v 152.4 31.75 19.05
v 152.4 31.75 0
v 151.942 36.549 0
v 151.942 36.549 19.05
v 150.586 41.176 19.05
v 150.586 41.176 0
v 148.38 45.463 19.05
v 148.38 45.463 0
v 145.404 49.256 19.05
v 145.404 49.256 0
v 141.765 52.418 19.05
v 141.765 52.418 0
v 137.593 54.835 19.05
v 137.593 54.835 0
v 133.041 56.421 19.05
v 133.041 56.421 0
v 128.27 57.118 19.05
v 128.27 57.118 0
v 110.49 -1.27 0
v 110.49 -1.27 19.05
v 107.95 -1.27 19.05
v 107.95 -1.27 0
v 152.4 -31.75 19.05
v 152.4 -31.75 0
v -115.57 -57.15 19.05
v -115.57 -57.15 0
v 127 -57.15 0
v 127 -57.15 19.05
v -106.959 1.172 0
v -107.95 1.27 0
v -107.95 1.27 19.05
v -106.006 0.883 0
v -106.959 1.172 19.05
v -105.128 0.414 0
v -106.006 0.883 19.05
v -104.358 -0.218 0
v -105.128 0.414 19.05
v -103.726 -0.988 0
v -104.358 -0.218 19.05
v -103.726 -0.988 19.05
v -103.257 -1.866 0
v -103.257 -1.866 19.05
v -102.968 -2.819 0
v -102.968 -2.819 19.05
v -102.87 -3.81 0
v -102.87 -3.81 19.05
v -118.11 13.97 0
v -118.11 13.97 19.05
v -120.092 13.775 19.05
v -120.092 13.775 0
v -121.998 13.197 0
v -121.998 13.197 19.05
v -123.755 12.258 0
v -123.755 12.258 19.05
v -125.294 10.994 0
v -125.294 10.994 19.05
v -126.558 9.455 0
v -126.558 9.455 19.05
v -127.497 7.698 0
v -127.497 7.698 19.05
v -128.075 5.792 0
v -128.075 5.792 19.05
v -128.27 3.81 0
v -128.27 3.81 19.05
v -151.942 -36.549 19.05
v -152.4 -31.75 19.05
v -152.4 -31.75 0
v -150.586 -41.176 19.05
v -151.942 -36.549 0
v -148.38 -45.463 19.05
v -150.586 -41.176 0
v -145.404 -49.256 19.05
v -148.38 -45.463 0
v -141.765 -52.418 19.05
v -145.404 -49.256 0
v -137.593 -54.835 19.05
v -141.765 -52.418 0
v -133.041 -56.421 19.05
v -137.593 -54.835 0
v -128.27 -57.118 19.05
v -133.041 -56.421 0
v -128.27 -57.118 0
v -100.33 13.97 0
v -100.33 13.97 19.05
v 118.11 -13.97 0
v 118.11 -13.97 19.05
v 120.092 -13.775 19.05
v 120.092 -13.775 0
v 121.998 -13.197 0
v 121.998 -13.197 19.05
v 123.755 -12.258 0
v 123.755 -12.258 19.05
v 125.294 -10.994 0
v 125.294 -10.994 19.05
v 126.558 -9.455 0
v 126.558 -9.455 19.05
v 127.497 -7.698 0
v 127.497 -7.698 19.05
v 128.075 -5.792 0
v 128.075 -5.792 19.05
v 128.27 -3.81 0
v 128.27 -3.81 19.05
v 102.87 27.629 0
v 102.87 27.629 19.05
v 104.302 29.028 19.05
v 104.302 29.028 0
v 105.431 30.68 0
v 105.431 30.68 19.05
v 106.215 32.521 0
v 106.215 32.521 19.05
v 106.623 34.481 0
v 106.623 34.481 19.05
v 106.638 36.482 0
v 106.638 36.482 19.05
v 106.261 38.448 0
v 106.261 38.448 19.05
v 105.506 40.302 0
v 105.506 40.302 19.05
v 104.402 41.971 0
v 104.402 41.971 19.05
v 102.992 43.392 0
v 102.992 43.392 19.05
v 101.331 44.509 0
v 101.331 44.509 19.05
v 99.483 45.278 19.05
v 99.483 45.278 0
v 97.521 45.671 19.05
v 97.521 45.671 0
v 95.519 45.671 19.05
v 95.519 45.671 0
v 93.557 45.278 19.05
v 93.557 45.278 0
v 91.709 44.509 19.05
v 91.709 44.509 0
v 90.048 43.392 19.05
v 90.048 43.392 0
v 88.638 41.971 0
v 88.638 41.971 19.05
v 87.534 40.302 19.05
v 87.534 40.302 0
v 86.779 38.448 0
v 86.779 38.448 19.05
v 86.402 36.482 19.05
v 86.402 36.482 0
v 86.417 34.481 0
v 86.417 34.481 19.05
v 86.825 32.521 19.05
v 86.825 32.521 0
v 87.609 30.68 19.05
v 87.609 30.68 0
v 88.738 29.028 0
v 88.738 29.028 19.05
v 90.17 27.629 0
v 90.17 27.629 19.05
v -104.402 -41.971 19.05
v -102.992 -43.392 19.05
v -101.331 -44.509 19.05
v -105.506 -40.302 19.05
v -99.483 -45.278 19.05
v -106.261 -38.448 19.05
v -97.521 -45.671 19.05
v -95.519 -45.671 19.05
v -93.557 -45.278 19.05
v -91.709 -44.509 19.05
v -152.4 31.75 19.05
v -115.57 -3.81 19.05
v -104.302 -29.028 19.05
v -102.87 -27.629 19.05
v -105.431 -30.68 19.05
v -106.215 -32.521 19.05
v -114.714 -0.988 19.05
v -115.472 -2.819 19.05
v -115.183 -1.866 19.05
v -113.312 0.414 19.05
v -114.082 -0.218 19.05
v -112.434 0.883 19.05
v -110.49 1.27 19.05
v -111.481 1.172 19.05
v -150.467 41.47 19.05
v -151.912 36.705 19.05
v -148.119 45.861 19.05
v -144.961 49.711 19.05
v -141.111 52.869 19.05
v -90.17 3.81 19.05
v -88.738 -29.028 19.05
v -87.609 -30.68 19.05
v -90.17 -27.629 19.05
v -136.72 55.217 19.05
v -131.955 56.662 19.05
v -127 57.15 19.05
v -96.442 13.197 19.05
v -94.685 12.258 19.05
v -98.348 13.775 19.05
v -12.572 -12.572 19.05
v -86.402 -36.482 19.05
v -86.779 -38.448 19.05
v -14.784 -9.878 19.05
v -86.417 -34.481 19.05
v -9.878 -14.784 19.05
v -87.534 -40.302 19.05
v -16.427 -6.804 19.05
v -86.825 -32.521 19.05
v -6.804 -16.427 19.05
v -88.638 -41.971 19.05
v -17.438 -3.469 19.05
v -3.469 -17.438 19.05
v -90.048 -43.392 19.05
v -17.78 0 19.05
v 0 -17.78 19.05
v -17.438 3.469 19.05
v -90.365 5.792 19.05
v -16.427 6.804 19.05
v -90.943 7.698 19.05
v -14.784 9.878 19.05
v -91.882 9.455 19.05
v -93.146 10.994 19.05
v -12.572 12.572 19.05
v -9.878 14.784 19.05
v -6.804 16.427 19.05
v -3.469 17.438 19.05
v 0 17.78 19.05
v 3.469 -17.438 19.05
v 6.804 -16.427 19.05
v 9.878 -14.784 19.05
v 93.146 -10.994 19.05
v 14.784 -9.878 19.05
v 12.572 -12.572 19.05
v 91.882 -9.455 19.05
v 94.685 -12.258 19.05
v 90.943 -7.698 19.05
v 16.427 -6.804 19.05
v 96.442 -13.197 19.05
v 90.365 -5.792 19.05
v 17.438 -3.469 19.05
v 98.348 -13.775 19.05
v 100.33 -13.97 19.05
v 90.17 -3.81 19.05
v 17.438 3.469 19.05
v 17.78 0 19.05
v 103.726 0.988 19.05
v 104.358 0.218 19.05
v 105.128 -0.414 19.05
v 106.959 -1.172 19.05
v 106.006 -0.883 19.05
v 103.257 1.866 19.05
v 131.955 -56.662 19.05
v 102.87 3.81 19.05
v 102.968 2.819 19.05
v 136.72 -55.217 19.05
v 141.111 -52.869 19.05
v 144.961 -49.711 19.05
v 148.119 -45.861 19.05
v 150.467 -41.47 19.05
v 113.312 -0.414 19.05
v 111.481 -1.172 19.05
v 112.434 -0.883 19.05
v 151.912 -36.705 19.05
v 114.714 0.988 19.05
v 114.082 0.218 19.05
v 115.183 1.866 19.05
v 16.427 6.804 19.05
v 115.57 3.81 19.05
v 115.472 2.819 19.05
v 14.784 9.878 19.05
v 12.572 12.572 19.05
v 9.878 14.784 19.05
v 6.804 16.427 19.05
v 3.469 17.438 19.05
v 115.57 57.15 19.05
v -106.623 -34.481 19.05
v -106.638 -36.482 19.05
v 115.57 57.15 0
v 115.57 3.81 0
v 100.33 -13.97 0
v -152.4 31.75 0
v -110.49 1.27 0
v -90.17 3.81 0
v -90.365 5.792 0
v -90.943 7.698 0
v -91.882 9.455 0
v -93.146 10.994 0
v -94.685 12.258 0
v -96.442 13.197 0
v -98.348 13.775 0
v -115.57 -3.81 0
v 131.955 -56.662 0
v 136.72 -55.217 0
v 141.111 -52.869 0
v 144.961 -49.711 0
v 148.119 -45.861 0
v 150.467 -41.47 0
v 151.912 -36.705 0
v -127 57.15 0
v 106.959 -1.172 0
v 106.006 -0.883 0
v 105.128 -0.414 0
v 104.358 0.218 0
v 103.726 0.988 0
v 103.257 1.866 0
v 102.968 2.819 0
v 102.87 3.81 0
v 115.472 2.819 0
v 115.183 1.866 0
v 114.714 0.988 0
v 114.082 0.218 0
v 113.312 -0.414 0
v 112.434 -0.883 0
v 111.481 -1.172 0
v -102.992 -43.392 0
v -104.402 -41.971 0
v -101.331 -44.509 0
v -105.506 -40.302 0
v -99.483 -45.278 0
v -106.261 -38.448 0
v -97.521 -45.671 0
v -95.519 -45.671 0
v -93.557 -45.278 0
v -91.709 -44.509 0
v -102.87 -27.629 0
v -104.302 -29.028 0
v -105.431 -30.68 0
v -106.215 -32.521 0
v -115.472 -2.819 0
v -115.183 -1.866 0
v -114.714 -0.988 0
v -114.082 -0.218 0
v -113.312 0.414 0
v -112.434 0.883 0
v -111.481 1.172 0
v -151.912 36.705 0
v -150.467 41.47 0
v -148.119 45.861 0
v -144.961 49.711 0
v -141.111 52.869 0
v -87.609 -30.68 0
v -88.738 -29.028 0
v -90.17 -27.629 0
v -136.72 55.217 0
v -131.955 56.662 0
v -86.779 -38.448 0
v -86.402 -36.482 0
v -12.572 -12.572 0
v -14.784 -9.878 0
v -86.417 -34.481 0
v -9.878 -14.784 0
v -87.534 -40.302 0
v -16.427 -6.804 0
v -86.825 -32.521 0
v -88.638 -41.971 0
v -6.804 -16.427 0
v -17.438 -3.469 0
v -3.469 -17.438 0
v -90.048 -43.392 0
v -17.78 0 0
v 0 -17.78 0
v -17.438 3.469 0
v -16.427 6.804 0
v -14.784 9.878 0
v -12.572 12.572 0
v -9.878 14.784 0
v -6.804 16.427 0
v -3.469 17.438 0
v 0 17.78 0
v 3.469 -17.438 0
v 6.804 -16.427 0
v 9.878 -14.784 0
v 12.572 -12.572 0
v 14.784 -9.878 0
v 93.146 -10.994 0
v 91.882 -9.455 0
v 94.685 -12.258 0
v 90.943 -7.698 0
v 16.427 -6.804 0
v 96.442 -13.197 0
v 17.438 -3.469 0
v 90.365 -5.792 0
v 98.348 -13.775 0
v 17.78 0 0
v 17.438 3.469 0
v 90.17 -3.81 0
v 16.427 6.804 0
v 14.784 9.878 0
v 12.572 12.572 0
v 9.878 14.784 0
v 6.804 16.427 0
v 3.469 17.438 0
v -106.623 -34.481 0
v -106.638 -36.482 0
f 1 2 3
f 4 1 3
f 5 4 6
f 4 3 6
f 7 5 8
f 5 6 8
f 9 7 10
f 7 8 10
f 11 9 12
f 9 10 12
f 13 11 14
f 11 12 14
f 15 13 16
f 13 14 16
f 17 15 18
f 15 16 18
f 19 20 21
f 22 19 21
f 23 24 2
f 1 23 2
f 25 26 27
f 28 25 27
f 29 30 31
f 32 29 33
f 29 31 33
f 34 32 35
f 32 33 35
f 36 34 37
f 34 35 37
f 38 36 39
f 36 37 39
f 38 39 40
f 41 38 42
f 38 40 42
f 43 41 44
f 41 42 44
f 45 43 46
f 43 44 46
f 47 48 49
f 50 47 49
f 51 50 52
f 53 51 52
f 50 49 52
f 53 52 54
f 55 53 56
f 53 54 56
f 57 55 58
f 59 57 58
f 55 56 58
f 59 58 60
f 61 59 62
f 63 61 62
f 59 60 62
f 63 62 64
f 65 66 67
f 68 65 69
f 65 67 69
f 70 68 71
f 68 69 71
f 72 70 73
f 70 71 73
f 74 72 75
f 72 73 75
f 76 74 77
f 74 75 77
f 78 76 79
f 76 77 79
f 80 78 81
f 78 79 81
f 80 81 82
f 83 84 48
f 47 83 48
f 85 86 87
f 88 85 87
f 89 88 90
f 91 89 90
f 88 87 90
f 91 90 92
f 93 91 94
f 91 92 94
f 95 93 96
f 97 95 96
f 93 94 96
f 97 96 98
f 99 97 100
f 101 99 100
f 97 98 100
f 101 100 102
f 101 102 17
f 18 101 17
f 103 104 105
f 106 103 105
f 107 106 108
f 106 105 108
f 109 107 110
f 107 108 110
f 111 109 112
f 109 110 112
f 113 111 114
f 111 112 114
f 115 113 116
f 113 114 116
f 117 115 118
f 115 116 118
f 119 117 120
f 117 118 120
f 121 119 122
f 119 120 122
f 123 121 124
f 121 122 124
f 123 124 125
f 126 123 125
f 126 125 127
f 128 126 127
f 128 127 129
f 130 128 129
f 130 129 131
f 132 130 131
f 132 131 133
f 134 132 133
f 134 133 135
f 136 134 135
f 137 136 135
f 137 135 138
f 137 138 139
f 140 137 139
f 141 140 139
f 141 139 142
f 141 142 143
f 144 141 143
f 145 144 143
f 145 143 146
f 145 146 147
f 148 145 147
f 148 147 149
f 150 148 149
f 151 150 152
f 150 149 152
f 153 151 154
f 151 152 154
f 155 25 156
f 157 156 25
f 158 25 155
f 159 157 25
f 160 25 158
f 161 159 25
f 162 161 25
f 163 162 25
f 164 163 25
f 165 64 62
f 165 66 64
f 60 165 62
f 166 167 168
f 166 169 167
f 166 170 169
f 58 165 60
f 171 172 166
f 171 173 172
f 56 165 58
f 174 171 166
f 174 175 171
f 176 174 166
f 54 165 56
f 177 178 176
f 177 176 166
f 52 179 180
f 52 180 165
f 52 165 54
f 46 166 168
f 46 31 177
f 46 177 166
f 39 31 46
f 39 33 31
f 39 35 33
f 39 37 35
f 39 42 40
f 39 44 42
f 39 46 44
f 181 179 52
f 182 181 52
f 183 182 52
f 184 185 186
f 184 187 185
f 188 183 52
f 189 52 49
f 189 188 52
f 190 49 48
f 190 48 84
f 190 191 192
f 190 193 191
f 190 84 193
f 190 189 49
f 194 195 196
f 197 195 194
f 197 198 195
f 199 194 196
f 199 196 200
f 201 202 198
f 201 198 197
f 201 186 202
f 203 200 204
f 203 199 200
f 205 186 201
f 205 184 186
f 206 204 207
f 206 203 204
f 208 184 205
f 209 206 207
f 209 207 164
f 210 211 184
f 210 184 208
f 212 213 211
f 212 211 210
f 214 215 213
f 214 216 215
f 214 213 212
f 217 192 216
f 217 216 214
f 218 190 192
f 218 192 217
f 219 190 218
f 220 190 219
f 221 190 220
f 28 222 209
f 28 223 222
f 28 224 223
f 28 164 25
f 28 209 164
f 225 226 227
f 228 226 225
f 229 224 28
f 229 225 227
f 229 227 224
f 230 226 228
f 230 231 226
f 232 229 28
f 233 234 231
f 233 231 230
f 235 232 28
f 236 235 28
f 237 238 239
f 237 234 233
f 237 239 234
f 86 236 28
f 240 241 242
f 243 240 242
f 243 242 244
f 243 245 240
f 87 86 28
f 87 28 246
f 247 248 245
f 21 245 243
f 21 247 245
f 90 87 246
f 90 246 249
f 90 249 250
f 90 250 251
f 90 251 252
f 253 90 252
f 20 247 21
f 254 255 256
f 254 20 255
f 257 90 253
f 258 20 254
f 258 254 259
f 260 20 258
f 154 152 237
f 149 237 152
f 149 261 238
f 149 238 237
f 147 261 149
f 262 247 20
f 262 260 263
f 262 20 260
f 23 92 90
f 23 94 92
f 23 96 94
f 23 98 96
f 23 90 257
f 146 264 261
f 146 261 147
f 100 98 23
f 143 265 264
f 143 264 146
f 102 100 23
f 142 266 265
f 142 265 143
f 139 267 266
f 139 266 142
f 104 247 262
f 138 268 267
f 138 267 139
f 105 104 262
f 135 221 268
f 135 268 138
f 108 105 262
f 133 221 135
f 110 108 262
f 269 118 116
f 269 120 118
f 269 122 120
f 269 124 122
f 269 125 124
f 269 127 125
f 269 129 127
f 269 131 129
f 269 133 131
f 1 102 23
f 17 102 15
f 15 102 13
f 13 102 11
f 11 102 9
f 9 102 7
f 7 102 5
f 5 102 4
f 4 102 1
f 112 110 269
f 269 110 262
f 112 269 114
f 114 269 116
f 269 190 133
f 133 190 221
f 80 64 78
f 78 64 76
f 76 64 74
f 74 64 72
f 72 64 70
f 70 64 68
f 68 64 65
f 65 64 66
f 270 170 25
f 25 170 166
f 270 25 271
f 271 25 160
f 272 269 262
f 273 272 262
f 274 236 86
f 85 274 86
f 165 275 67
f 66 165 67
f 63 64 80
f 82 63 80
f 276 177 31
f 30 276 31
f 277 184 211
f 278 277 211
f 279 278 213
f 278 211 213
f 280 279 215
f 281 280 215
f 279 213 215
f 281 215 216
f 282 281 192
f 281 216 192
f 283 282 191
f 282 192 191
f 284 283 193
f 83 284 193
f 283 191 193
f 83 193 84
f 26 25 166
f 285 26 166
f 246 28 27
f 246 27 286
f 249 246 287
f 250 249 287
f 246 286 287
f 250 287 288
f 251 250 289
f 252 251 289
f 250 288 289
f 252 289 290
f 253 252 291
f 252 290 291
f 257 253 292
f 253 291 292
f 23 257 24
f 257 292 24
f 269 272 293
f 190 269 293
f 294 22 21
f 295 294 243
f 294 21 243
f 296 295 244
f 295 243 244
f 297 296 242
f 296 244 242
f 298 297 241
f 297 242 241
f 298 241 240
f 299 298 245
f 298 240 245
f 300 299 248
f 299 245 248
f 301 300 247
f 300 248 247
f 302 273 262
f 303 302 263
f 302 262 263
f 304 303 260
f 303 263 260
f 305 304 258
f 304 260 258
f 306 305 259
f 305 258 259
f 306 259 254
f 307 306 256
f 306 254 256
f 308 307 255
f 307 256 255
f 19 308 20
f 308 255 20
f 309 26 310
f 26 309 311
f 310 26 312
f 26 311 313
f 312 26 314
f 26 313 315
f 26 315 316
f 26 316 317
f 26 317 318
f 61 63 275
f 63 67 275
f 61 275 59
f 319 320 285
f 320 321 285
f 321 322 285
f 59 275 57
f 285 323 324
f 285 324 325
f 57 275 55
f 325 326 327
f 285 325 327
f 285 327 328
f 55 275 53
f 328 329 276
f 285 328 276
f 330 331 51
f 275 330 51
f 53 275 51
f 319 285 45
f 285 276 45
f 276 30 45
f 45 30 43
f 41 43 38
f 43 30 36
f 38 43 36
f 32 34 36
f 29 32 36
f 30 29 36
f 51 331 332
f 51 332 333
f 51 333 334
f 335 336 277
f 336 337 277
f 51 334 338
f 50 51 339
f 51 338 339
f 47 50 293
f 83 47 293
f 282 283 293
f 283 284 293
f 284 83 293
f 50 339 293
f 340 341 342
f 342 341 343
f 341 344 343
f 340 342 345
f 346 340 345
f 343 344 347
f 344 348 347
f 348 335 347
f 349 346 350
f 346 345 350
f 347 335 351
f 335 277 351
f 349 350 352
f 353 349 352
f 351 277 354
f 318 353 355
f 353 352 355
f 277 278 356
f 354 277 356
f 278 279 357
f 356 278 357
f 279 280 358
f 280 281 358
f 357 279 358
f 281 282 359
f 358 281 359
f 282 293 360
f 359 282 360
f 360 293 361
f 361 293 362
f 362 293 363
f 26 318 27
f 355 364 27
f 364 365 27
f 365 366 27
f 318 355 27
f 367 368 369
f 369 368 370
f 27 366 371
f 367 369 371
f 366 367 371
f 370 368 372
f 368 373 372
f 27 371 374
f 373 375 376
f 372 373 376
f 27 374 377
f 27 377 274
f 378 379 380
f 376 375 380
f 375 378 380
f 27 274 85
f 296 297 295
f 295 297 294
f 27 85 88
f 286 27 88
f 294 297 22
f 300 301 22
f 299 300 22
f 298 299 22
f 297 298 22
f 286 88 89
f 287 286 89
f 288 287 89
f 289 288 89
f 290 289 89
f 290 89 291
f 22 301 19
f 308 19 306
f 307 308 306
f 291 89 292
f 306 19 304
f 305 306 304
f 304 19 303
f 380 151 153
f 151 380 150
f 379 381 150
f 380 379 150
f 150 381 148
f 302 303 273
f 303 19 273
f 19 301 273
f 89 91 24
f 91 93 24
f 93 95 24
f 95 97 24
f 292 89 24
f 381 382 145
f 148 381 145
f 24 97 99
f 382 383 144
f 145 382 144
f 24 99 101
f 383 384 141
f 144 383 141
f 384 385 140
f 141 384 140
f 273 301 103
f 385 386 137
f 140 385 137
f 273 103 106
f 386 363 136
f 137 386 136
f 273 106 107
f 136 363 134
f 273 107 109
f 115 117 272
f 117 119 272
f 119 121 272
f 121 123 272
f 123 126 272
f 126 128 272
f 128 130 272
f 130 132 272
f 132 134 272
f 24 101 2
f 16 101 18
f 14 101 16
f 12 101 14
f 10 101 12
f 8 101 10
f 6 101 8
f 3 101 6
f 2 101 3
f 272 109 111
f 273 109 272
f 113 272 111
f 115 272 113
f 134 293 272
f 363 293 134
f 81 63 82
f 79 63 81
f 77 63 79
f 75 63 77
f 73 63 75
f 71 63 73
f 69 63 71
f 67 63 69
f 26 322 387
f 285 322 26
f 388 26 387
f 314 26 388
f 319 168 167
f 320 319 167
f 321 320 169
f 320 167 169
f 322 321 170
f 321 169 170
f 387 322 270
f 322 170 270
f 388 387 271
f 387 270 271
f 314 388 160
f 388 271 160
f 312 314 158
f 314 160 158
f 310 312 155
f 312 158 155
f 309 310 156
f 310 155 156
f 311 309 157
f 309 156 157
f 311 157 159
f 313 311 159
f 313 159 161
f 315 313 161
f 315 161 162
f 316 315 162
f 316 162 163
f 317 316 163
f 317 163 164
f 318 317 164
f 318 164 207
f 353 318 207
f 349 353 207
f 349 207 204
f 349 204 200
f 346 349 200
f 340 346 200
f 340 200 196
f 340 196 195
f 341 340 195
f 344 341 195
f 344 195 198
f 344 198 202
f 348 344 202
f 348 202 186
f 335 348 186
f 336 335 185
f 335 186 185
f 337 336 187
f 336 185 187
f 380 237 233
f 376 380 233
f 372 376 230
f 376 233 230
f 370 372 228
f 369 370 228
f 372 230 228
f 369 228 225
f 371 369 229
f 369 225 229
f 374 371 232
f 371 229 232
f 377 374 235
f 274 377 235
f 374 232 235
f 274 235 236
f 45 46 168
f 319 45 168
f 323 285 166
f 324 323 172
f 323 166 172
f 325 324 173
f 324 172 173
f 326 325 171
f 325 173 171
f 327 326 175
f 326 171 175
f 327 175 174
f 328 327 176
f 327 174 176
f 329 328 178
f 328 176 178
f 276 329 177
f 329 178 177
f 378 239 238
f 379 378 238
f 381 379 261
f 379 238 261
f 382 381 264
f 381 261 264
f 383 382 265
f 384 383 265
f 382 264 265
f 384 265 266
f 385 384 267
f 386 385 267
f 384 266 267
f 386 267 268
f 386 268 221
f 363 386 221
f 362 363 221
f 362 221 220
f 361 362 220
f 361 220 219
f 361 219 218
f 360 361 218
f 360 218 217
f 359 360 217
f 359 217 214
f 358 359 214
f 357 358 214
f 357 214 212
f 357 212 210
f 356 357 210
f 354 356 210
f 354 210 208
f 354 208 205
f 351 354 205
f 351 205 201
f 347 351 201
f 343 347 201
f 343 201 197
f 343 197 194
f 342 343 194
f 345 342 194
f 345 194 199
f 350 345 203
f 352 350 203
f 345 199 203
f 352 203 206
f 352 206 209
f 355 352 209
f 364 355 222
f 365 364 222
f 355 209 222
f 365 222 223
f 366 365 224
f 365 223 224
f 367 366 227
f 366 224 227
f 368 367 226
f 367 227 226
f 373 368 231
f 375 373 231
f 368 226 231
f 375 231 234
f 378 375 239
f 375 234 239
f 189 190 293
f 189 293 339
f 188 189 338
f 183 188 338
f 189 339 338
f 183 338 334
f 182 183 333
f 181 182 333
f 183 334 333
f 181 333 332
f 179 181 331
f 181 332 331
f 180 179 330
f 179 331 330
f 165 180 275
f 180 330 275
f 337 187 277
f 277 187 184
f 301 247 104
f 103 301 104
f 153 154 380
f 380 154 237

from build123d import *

# Parameters (mm, degrees)
F1_DEPTH = 19.05
F2_R     = 17.78
F3_DEPTH = 19.051
F5_DEPTH = 19.051


with BuildPart() as f1:
    # F0 (on Top) → F1 (new body)
    with BuildSketch(Plane.XY):
        with BuildLine():
            ThreePointArc((152.4, 31.75), (144.9605122421, 49.7105122421), (127, 57.15))
            Line((127, 57.15), (-127, 57.15))
            ThreePointArc((-127, 57.15), (-144.9605122421, 49.7105122421), (-152.4, 31.75))
            Line((-152.4, 31.75), (-152.4, -31.75))
            ThreePointArc((-152.4, -31.75), (-144.9605122421, -49.7105122421), (-127, -57.15))
            Line((-127, -57.15), (127, -57.15))
            ThreePointArc((127, -57.15), (144.9605122421, -49.7105122421), (152.4, -31.75))
            Line((152.4, -31.75), (152.4, 31.75))
        make_face()
    extrude(amount=F1_DEPTH)

    # F2 (on face) → F3 (cut, through all)
    with BuildSketch(Plane.XY.offset(19.05)):
        Circle(F2_R)
    extrude(amount=-F3_DEPTH, mode=Mode.SUBTRACT)

    # F4 (on face) → F5 (cut, through all)
    with BuildSketch(Plane.XY.offset(19.05)):
        with BuildLine():
            Line((128.27, -3.81), (128.27, 57.15))
            Line((128.27, 57.15), (115.57, 57.15))
            Line((115.57, 57.15), (115.57, 3.81))
            ThreePointArc((115.57, 3.81), (114.0821024484, 0.2178975516), (110.49, -1.27))
            Line((110.49, -1.27), (107.95, -1.27))
            ThreePointArc((107.95, -1.27), (104.3578975516, 0.2178975516), (102.87, 3.81))
            Line((102.87, 3.81), (102.87, 27.628852542))
            ThreePointArc((102.87, 27.628852542), (96.52, 45.72), (90.17, 27.628852542))
            Line((90.17, 27.628852542), (90.17, -3.81))
            ThreePointArc((90.17, -3.81), (93.1457951031, -10.9942048969), (100.33, -13.97))
            Line((100.33, -13.97), (118.11, -13.97))
            ThreePointArc((118.11, -13.97), (125.2942048969, -10.9942048969), (128.27, -3.81))
        make_face()
        with BuildLine():
            Line((-128.27, 3.81), (-128.27, -57.1182301314))
            ThreePointArc((-128.27, -57.1182301314), (-127.6351986549, -57.1420562907), (-127, -57.15))
            Line((-127, -57.15), (-115.57, -57.15))
            Line((-115.57, -57.15), (-115.57, -3.81))
            ThreePointArc((-115.57, -3.81), (-114.0821024484, -0.2178975516), (-110.49, 1.27))
            Line((-110.49, 1.27), (-107.95, 1.27))
            ThreePointArc((-107.95, 1.27), (-104.3578975516, -0.2178975516), (-102.87, -3.81))
            Line((-102.87, -3.81), (-102.87, -27.628852542))
            ThreePointArc((-102.87, -27.628852542), (-96.52, -45.72), (-90.17, -27.628852542))
            Line((-90.17, -27.628852542), (-90.17, 3.81))
            ThreePointArc((-90.17, 3.81), (-93.1457951031, 10.9942048969), (-100.33, 13.97))
            Line((-100.33, 13.97), (-118.11, 13.97))
            ThreePointArc((-118.11, 13.97), (-125.2942048969, 10.9942048969), (-128.27, 3.81))
        make_face()
    extrude(amount=-F5_DEPTH, mode=Mode.SUBTRACT)


solid = f1.part
